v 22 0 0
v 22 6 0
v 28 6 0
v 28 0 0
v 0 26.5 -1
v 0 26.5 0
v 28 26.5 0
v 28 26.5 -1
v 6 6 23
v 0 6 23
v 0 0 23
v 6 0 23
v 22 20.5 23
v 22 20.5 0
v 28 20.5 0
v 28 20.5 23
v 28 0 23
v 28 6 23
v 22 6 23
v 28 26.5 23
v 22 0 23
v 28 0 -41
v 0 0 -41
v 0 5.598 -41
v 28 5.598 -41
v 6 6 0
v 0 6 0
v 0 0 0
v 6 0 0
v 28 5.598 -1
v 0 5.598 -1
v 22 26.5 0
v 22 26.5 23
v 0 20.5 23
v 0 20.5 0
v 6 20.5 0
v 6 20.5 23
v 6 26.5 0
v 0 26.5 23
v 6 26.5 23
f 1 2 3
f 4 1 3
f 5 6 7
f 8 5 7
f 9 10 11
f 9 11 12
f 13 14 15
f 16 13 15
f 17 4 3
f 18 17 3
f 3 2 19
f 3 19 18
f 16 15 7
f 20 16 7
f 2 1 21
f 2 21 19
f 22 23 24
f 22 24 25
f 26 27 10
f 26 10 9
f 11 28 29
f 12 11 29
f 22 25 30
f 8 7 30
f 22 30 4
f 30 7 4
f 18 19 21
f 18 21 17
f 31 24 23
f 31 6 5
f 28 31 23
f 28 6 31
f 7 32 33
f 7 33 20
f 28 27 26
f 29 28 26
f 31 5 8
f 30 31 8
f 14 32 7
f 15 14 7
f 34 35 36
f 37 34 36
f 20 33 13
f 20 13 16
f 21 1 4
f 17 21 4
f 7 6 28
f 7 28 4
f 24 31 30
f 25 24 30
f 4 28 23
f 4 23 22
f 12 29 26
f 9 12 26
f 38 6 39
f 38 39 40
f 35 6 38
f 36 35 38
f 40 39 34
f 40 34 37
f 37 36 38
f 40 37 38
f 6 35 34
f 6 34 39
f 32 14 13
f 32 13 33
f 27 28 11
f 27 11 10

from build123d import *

# Parameters (mm, degrees)
F0_W     = 6
F0_H     = 6
F1_DEPTH = 23
F2_W     = 28
F2_H     = 26.5
F3_DEPTH = 1
F4_W     = 28
F4_H     = 5.598342
F5_DEPTH = 40


with BuildPart() as f1:
    # F0 (on Top) → F1 (new body)
    with BuildSketch(Plane.XY):
        with Locations((3, 3)):
            Rectangle(F0_W, F0_H)
        with Locations((3, 23.5)):
            Rectangle(F0_W, F0_H)
        with Locations((25, 3)):
            Rectangle(F0_W, F0_H)
        with Locations((25, 23.5)):
            Rectangle(F0_W, F0_H)
    extrude(amount=F1_DEPTH)


with BuildPart() as f3:
    # F2 (on Top) → F3 (new body)
    with BuildSketch(Plane.XY):
        with Locations((14, 13.25)):
            Rectangle(F2_W, F2_H)
    extrude(amount=-F3_DEPTH)

    # F4 (on face) → F5 (join)
    with BuildSketch(Plane(origin=(0, 0, -1), x_dir=(1, 0, 0), z_dir=(0, 0, -1))):
        with Locations((14, -2.799171)):
            Rectangle(F4_W, F4_H)
    extrude(amount=F5_DEPTH)


solid = Compound([f1.part, f3.part])
